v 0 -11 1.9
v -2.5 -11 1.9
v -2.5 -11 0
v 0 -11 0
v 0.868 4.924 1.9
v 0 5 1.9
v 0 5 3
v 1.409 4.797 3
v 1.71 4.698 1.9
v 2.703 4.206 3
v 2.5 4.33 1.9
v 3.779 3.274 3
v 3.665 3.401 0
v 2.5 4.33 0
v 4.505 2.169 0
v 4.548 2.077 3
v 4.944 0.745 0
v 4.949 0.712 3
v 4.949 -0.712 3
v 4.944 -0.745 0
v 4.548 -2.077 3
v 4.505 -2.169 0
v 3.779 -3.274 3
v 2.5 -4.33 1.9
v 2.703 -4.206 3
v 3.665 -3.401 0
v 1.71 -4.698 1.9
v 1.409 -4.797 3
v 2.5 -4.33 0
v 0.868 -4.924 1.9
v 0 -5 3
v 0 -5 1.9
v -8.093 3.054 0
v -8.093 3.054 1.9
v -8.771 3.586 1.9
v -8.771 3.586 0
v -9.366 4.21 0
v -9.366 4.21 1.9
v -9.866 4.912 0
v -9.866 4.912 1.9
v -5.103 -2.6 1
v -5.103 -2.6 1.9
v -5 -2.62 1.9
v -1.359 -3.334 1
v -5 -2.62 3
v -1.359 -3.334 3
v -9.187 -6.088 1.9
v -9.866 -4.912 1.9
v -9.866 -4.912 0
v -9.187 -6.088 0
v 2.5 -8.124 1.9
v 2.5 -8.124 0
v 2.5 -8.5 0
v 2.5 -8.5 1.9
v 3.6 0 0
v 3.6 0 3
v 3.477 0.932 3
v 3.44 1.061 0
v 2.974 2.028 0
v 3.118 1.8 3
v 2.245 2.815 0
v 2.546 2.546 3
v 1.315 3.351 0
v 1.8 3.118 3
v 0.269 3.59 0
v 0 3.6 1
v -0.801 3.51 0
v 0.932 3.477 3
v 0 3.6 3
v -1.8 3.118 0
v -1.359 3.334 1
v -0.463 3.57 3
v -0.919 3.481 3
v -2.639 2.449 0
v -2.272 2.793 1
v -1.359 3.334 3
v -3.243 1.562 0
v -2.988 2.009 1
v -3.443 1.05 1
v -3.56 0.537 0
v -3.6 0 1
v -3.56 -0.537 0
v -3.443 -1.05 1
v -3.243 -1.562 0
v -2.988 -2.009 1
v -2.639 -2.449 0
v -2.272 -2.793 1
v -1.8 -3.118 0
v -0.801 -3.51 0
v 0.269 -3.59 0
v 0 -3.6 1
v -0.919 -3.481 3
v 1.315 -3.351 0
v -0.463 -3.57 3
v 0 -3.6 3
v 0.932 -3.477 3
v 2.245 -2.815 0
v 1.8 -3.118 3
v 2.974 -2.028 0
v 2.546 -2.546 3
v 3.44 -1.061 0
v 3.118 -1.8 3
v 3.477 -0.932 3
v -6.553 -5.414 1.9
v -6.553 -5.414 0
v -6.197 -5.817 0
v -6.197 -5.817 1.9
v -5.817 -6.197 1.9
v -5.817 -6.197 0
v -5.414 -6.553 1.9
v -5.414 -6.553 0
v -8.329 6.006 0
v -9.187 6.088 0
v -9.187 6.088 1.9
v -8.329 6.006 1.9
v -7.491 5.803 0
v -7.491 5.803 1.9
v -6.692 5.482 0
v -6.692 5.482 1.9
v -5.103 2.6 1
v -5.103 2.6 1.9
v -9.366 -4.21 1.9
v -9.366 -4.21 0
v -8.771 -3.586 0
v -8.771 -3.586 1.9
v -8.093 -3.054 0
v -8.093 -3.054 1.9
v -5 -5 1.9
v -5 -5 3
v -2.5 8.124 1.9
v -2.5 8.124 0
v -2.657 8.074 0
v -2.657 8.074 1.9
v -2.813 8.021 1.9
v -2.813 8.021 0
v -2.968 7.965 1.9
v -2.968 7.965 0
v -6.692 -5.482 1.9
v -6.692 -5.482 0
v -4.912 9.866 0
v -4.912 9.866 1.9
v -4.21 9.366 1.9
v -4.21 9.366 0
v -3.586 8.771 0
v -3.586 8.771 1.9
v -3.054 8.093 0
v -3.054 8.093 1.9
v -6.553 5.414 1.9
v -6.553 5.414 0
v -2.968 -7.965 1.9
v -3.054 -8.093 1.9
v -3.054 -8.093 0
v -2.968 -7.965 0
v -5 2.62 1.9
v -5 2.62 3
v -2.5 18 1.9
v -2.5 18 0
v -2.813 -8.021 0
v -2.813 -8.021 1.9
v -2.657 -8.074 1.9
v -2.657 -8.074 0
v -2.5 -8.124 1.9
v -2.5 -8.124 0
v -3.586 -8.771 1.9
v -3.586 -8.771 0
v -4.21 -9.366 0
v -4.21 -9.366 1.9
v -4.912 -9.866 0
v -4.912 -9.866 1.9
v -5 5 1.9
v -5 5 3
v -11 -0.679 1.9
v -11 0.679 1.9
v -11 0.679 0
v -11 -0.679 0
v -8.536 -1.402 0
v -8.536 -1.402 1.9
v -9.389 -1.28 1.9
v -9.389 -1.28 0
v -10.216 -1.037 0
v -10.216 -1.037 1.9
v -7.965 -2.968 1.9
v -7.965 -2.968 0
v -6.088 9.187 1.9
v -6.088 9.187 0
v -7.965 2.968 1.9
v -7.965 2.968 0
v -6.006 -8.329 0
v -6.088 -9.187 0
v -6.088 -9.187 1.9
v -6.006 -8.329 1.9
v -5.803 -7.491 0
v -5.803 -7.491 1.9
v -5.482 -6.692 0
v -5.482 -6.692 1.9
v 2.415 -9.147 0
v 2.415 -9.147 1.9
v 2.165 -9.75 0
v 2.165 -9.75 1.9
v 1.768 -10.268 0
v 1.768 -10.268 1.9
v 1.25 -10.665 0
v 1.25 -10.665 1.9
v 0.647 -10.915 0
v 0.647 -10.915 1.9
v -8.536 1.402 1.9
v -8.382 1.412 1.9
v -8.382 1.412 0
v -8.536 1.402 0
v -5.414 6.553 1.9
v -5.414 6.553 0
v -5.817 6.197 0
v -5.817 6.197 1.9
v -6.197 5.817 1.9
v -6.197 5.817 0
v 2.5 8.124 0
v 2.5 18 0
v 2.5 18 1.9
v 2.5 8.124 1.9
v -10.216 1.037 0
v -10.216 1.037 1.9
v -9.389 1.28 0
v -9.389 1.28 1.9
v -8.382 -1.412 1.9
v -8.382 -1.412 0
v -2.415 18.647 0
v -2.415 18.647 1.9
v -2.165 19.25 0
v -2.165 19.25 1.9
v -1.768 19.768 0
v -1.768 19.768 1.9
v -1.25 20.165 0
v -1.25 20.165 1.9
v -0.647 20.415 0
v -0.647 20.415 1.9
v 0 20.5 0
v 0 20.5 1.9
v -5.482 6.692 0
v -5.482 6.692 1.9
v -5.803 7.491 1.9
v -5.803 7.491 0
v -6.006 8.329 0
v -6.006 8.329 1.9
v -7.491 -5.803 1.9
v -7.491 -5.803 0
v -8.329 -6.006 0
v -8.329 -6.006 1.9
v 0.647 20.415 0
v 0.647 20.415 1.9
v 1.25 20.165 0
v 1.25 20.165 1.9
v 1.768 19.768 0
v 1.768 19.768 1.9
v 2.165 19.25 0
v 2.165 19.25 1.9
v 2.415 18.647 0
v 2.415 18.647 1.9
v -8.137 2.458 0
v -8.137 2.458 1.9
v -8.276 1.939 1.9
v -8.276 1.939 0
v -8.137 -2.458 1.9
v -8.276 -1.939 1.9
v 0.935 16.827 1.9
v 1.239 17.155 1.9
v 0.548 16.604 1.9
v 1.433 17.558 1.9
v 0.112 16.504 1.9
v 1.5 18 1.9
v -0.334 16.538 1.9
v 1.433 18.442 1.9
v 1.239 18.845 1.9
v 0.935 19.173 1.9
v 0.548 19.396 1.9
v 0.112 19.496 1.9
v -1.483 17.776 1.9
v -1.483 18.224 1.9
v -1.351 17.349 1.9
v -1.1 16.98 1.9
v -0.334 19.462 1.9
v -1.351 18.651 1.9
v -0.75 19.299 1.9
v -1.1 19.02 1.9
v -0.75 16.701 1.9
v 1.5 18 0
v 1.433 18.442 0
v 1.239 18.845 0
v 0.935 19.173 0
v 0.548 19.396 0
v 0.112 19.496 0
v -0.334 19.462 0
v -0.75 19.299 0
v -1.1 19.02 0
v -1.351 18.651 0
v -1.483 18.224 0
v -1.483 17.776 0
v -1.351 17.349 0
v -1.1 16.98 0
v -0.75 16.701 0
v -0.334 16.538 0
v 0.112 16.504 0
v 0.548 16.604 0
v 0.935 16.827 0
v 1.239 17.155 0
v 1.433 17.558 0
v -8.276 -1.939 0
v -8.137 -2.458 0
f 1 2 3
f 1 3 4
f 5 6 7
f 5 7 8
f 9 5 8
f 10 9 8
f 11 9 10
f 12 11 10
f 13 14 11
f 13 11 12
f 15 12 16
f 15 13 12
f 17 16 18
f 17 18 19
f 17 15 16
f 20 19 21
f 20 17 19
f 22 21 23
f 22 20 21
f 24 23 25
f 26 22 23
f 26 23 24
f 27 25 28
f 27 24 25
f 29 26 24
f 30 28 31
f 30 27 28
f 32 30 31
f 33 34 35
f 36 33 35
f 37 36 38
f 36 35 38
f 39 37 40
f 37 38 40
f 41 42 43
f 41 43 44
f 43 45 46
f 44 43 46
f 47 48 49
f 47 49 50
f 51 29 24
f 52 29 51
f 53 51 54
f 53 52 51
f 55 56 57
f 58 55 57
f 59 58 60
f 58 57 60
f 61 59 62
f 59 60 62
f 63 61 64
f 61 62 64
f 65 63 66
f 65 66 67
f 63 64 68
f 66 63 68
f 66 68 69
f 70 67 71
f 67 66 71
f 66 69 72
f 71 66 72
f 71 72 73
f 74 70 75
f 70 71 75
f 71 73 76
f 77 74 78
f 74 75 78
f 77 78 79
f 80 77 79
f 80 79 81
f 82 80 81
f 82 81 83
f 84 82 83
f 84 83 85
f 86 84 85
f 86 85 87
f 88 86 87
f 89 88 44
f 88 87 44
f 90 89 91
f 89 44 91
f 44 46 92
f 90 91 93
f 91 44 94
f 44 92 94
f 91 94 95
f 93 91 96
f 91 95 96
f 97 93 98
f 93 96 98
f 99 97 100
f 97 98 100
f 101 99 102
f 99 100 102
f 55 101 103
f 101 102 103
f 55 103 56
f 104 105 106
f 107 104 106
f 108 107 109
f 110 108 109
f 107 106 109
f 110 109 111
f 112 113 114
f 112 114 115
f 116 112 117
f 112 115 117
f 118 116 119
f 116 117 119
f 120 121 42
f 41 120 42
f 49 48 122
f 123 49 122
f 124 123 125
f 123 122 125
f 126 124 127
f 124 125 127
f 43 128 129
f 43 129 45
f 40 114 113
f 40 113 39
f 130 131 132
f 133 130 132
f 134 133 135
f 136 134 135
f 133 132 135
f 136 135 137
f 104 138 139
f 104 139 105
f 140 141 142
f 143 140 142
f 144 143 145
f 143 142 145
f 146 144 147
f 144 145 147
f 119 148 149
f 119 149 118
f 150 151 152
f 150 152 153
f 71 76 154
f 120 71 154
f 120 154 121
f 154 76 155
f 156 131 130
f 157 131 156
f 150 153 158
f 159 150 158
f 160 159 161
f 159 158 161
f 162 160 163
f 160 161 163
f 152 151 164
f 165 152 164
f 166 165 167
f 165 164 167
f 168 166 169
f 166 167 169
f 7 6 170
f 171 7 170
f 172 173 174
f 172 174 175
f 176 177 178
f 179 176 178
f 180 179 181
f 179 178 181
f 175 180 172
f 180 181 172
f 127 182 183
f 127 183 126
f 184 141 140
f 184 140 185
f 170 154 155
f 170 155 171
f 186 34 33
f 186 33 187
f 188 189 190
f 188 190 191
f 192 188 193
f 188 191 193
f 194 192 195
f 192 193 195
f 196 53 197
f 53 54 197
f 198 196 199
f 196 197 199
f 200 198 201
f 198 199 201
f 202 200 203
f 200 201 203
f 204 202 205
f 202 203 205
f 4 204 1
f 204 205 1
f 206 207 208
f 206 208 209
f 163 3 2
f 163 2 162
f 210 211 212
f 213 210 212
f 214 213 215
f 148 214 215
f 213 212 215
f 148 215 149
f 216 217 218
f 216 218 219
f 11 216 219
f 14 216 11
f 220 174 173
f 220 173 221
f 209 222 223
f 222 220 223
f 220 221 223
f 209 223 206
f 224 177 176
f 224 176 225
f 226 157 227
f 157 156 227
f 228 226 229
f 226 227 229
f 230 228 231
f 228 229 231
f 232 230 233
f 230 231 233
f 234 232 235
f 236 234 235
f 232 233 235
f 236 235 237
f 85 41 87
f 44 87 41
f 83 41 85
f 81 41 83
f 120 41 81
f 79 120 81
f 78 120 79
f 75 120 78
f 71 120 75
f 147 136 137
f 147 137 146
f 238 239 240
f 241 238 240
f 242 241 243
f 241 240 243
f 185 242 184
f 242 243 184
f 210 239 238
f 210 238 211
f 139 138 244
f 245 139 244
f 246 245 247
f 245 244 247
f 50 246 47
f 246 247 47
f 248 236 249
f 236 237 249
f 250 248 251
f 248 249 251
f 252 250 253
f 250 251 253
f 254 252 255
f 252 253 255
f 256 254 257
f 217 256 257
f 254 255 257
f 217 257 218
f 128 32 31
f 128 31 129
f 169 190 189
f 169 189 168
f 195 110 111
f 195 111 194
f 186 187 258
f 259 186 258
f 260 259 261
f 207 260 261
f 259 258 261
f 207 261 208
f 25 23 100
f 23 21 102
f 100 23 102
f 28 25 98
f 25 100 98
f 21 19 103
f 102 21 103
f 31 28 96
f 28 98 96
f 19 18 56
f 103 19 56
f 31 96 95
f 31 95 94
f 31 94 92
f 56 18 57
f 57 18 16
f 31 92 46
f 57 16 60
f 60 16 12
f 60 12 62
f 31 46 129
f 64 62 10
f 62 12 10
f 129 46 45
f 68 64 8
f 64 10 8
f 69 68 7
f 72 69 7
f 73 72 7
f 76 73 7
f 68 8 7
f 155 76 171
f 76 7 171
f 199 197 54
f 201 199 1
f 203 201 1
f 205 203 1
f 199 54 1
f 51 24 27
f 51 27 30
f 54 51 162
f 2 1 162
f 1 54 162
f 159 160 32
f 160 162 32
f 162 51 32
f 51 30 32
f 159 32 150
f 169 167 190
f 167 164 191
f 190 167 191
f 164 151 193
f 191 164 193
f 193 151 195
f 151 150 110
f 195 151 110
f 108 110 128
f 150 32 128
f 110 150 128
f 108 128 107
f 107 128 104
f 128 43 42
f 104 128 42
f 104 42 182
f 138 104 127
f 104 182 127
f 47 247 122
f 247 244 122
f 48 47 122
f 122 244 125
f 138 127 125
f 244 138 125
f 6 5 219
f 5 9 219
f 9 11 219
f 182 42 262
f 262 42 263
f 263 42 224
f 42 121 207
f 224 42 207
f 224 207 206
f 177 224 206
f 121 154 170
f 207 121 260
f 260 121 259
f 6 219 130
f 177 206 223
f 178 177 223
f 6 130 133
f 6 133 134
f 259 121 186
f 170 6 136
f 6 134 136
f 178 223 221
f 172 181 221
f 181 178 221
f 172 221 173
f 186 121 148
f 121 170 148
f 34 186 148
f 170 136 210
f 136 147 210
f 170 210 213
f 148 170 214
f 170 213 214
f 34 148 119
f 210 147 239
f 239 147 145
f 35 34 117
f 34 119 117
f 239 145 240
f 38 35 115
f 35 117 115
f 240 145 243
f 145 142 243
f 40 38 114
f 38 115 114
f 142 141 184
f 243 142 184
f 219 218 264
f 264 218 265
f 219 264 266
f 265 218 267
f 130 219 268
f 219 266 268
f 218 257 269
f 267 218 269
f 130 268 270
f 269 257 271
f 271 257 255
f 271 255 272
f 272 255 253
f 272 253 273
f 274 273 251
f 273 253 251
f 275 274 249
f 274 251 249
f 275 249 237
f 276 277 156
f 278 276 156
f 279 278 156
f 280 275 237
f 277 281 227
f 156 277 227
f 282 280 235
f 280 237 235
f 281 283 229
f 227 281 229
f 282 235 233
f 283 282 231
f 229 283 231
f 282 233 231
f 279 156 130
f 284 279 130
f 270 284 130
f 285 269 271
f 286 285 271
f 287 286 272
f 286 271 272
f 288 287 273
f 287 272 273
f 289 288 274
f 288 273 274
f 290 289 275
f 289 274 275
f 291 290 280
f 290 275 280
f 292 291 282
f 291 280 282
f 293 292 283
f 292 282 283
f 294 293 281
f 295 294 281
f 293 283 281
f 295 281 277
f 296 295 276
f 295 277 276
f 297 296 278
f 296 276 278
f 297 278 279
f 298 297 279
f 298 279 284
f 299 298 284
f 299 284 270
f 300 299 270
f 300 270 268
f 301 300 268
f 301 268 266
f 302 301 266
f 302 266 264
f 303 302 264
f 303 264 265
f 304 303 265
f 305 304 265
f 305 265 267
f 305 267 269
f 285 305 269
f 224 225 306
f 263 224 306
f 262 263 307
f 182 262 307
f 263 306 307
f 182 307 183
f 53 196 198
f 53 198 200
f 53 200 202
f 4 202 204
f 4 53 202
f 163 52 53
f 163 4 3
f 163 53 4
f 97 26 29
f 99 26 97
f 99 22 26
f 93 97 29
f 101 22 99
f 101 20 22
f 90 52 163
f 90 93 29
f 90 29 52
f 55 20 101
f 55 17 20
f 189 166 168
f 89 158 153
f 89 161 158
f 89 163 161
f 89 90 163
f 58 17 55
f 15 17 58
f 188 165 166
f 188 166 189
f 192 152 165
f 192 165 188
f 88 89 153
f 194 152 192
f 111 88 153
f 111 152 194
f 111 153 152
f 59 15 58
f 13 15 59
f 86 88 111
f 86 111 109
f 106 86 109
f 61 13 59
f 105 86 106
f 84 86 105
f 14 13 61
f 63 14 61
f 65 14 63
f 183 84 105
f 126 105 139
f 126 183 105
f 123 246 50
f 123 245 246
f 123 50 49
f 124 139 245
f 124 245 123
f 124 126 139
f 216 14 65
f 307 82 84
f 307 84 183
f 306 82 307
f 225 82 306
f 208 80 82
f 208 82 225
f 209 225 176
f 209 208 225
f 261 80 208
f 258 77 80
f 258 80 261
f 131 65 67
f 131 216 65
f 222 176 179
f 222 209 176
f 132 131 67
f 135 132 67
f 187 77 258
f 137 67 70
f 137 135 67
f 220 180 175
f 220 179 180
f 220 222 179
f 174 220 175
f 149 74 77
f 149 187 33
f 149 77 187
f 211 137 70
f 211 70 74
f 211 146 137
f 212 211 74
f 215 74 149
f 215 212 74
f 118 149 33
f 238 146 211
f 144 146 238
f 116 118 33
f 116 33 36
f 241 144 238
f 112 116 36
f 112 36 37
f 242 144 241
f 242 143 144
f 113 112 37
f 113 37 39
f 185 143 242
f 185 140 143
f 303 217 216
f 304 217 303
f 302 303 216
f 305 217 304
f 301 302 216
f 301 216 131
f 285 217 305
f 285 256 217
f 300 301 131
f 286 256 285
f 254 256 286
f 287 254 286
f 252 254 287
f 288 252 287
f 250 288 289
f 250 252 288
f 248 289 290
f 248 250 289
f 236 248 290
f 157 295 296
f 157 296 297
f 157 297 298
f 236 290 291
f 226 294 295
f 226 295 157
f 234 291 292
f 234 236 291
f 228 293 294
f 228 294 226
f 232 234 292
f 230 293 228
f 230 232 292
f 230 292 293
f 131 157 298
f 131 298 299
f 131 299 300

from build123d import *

# Parameters (mm, degrees)
SKETCH1_R           = 8.5
BOSS_EXTRUDE1_DEPTH = 1.9
BOSS_EXTRUDE2_DEPTH = 1.9
CIRPATTERN2_COUNT   = 12
FILLET5_R           = 6
FILLET6_R           = 6
BOSS_EXTRUDE3_DEPTH = 1.9
SKETCH6_W           = 11.017873235
SKETCH6_H           = 24.192230011
CUT_EXTRUDE2_DEPTH  = 24.342236397
SKETCH8_R           = 5
BOSS_EXTRUDE4_DEPTH = 3
SKETCH14_W          = 5
SKETCH14_H          = 10
BOSS_EXTRUDE8_DEPTH = 3
SKETCH17_R          = 1.5
CUT_EXTRUDE10_DEPTH = 24.342236397
FILLET9_R           = 2.5
FILLET10_R          = 2.5
CUT_EXTRUDE11_DEPTH = 2
SKETCH20_R          = 3.6
CUT_EXTRUDE12_DEPTH = 24.457408211


# Some blends are built 0.0001 mm under size
with BuildPart() as part:
    # Sketch1 → Boss-Extrude1 (new body)
    with BuildSketch(Plane.XY):
        with Locations(Location((0, 0, 0), (0, 0, 180))):
            Circle(SKETCH1_R)
    extrude(amount=BOSS_EXTRUDE1_DEPTH)

    # Sketch3 → Boss-Extrude2 (add)
    with BuildSketch(Plane.XY.offset(1.9)):
        Polygon((-1.305261922, 9.914448614), (-1.509060022, 7), (1.509060022, 7), (1.305261922, 9.914448614), (0.678518537, 11), (-0.678518537, 11), align=None)
    boss_extrude2 = extrude(amount=-BOSS_EXTRUDE2_DEPTH)

    # CirPattern2: Boss-Extrude2 ×12 about axis
    cirpattern2_axis = Axis((0, 0, 0), (0, 0, 1))
    for i in range(1, CIRPATTERN2_COUNT):
        add(boss_extrude2.rotate(cirpattern2_axis, i * 360 / CIRPATTERN2_COUNT))

    # Fillet5
    # the kernel refuses this fillet: 6 mm, written as the material it takes off along each edge
    with BuildSketch(Plane(origin=(9.238795325, 3.826834324, 5.354382408), x_dir=(0.49999999999981276, 0.8660254037845467, 0), z_dir=(0, 0, -1)), Plane(origin=(1.305261922, 9.914448614, 5.354382408), x_dir=(-0.5000000000001841, 0.8660254037843323, 0), z_dir=(0, 0, -1)), Plane(origin=(-7.933533403, 6.08761429, 5.354382408), x_dir=(-1, 0, 0), z_dir=(0, 0, -1)), Plane(origin=(-9.914448614, 1.305261922, 5.354382408), x_dir=(-0.8660254037843321, -0.5000000000001844, 0), z_dir=(0, 0, -1)), Plane(origin=(-9.238795325, -3.826834324, 5.354382408), x_dir=(-0.49999999999981826, -0.8660254037845436, 0), z_dir=(0, 0, -1)), Plane(origin=(-6.08761429, -7.933533403, 5.354382408), x_dir=(0, -1, 0), z_dir=(0, 0, -1)), Plane(origin=(3.826834324, -9.238795325, 5.354382408), x_dir=(0.8660254037845474, -0.49999999999981154, 0), z_dir=(0, 0, -1)), Plane(origin=(7.933533403, -6.08761429, 5.354382408), x_dir=(1, 0, 0), z_dir=(0, 0, -1)), Plane(origin=(9.914448614, -1.305261922, 5.354382408), x_dir=(0.866025403784333, 0.500000000000183, 0), z_dir=(0, 0, -1))) as fillet5_piece_1:
        with BuildLine():
            CenterArc((1.388315544, -5.998484909), FILLET5_R, 91.287628333, 24.712371667)
            Line((-1.241911337, -0.605720631), (-1.294515874, -0.497865346))
            Line((-1.294515874, -0.497865346), (-0.052604538, 0.107855286))
            Line((-0.052604538, 0.107855286), (0, 0.12))
            ThreePointArc((0, 0.12), (0.626743385, 0.12), (1.250790195, 0.119969698))
            Line((1.250790195, 0.119969698), (1.25348677, 0))
        make_face()
    extrude(amount=8.808764816, mode=Mode.SUBTRACT)
    with BuildSketch(Plane(origin=(6.08761429, 7.933533403, 5.354382408), x_dir=(-0.4383711467890806, -0.8987940462991654, 0), z_dir=(0, 0, -1)), Plane(origin=(-3.826834324, 9.238795325, 5.354382408), x_dir=(0.5591929034707432, -0.8290375725550441, 0), z_dir=(0, 0, -1)), Plane(origin=(-1.305261922, -9.914448614, 5.354382408), x_dir=(-0.06975647374412203, 0.9975640502598244, 0), z_dir=(0, 0, -1))) as fillet5_piece_2:
        with BuildLine():
            CenterArc((1.381752963, 6), FILLET5_R, 245.287628333, 24.712371667)
            Line((-1.126626446, 0.549492433), (-1.176794034, 0.440482282))
            ThreePointArc((-1.176794034, 0.440482282), (-0.615917761, 0.166890931), (-0.052604538, -0.107855286))
            Line((-0.052604538, -0.107855286), (0, -0.12))
            Line((0, -0.12), (1.381752963, -0.12))
            Line((1.381752963, -0.12), (1.381752963, 0))
        make_face()
    extrude(amount=8.808764816, mode=Mode.SUBTRACT)

    # Fillet6
    # the kernel refuses this fillet: 6 mm, written as the material it takes off along each edge
    with BuildSketch(Plane(origin=(7.933533403, 6.08761429, 5.354382408), x_dir=(-0.8987940462991681, -0.4383711467890751, 0), z_dir=(0, 0, -1)), Plane(origin=(3.826834324, 9.238795325, 5.354382408), x_dir=(-0.5591929034707512, -0.8290375725550386, 0), z_dir=(0, 0, -1)), Plane(origin=(-1.305261922, 9.914448614, 5.354382408), x_dir=(-0.06975647374412959, -0.9975640502598239, 0), z_dir=(0, 0, -1)), Plane(origin=(-6.08761429, 7.933533403, 5.354382408), x_dir=(0.43837114678907496, -0.8987940462991681, 0), z_dir=(0, 0, -1)), Plane(origin=(-9.238795325, 3.826834324, 5.354382408), x_dir=(0.8290375725550395, -0.5591929034707501, 0), z_dir=(0, 0, -1)), Plane(origin=(-9.914448614, -1.305261922, 5.354382408), x_dir=(0.9975640502598241, -0.0697564737441288, 0), z_dir=(0, 0, -1)), Plane(origin=(-7.933533403, -6.08761429, 5.354382408), x_dir=(0.8987940462991686, 0.4383711467890744, 0), z_dir=(0, 0, -1)), Plane(origin=(-3.826834324, -9.238795325, 5.354382408), x_dir=(0.5591929034707488, 0.8290375725550403, 0), z_dir=(0, 0, -1)), Plane(origin=(1.305261922, -9.914448614, 5.354382408), x_dir=(0.06975647374412966, 0.9975640502598239, 0), z_dir=(0, 0, -1)), Plane(origin=(6.08761429, -7.933533403, 5.354382408), x_dir=(-0.4383711467890749, 0.8987940462991683, 0), z_dir=(0, 0, -1)), Plane(origin=(9.238795325, -3.826834324, 5.354382408), x_dir=(-0.8290375725550393, 0.5591929034707505, 0), z_dir=(0, 0, -1)), Plane(origin=(9.914448614, 1.305261922, 5.354382408), x_dir=(-0.9975640502598239, 0.06975647374412894, 0), z_dir=(0, 0, -1))) as fillet6_piece_1:
        with BuildLine():
            CenterArc((1.381752963, -6), FILLET6_R, 90, 24.712371667)
            Line((-1.126626446, -0.549492433), (-1.176794034, -0.440482282))
            ThreePointArc((-1.176794034, -0.440482282), (-0.615917761, -0.166890931), (-0.052604538, 0.107855286))
            Line((-0.052604538, 0.107855286), (0, 0.12))
            Line((0, 0.12), (1.381752963, 0.12))
            Line((1.381752963, 0.12), (1.381752963, 0))
        make_face()
    extrude(amount=8.808764816, mode=Mode.SUBTRACT)

    # Sketch4 → Boss-Extrude3 (add)
    with BuildSketch(Plane(origin=(0, 0, 0), x_dir=(-1, 0, 0), z_dir=(0, 0, -1))):
        with BuildLine():
            Line((-2.5, 20.5), (-2.5, 4.330127019))
            ThreePointArc((-2.5, 4.330127019), (-5, 0), (-2.5, -4.330127019))
            Line((-2.5, -4.330127019), (-2.5, -11))
            Line((-2.5, -11), (2.5, -11))
            Line((2.5, -11), (2.5, -4.330127019))
            ThreePointArc((2.5, -4.330127019), (5, 0), (2.5, 4.330127019))
            Line((2.5, 4.330127019), (2.5, 20.5))
            Line((2.5, 20.5), (-2.5, 20.5))
        make_face()
    extrude(amount=-BOSS_EXTRUDE3_DEPTH)

    # Sketch6 → Cut-Extrude2 (cut, through all)
    with BuildSketch(Plane(origin=(0, 0, 0), x_dir=(-1, 0, 0), z_dir=(0, 0, -1))):
        with Locations((-8.008936618, 1.096115006)):
            Rectangle(SKETCH6_W, SKETCH6_H)
    extrude(amount=-CUT_EXTRUDE2_DEPTH, mode=Mode.SUBTRACT)

    # Sketch8 → Boss-Extrude4 (add)
    with BuildSketch(Plane(origin=(0, 0, 0), x_dir=(-1, 0, 0), z_dir=(0, 0, -1))):
        Circle(SKETCH8_R)
    extrude(amount=-BOSS_EXTRUDE4_DEPTH)

    # Sketch14 → Boss-Extrude8 (add)
    with BuildSketch(Plane(origin=(0, 0, 0), x_dir=(-1, 0, 0), z_dir=(0, 0, -1))):
        with Locations((2.5, 0)):
            Rectangle(SKETCH14_W, SKETCH14_H)
    extrude(amount=-BOSS_EXTRUDE8_DEPTH)

    # Sketch17 → Cut-Extrude10 (cut, through all)
    with BuildSketch(Plane.XY.offset(1.9)):
        with Locations((0, 18)):
            Circle(SKETCH17_R)
    extrude(amount=-CUT_EXTRUDE10_DEPTH, mode=Mode.SUBTRACT)

    # Fillet9
    fillet9_edges = [part.edges().sort_by_distance(p)[0] for p in [
        (-2.5, 20.5, 0.95),
        (2.5, 20.5, 0.95),
    ]]
    fillet(fillet9_edges, radius=FILLET9_R - 0.0001)  # a hair under: the kernel refuses the full size

    # Fillet10
    fillet10_edges = [part.edges().sort_by_distance(p)[0] for p in [
        (2.5, -11, 0.95),
    ]]
    fillet(fillet10_edges, radius=FILLET10_R)

    # Sketch19 → Cut-Extrude11 (cut)
    with BuildSketch(Plane.XY.offset(3)):
        Polygon((0, 3.6), (-5.102940329, 2.6), (-5.102940329, -2.6), (0, -3.6), align=None)
    extrude(amount=-CUT_EXTRUDE11_DEPTH, mode=Mode.SUBTRACT)

    # Sketch20 → Cut-Extrude12 (cut, through all)
    with BuildSketch(Plane.XY.offset(3)):
        Circle(SKETCH20_R)
    extrude(amount=-CUT_EXTRUDE12_DEPTH, mode=Mode.SUBTRACT)


solid = part.part
